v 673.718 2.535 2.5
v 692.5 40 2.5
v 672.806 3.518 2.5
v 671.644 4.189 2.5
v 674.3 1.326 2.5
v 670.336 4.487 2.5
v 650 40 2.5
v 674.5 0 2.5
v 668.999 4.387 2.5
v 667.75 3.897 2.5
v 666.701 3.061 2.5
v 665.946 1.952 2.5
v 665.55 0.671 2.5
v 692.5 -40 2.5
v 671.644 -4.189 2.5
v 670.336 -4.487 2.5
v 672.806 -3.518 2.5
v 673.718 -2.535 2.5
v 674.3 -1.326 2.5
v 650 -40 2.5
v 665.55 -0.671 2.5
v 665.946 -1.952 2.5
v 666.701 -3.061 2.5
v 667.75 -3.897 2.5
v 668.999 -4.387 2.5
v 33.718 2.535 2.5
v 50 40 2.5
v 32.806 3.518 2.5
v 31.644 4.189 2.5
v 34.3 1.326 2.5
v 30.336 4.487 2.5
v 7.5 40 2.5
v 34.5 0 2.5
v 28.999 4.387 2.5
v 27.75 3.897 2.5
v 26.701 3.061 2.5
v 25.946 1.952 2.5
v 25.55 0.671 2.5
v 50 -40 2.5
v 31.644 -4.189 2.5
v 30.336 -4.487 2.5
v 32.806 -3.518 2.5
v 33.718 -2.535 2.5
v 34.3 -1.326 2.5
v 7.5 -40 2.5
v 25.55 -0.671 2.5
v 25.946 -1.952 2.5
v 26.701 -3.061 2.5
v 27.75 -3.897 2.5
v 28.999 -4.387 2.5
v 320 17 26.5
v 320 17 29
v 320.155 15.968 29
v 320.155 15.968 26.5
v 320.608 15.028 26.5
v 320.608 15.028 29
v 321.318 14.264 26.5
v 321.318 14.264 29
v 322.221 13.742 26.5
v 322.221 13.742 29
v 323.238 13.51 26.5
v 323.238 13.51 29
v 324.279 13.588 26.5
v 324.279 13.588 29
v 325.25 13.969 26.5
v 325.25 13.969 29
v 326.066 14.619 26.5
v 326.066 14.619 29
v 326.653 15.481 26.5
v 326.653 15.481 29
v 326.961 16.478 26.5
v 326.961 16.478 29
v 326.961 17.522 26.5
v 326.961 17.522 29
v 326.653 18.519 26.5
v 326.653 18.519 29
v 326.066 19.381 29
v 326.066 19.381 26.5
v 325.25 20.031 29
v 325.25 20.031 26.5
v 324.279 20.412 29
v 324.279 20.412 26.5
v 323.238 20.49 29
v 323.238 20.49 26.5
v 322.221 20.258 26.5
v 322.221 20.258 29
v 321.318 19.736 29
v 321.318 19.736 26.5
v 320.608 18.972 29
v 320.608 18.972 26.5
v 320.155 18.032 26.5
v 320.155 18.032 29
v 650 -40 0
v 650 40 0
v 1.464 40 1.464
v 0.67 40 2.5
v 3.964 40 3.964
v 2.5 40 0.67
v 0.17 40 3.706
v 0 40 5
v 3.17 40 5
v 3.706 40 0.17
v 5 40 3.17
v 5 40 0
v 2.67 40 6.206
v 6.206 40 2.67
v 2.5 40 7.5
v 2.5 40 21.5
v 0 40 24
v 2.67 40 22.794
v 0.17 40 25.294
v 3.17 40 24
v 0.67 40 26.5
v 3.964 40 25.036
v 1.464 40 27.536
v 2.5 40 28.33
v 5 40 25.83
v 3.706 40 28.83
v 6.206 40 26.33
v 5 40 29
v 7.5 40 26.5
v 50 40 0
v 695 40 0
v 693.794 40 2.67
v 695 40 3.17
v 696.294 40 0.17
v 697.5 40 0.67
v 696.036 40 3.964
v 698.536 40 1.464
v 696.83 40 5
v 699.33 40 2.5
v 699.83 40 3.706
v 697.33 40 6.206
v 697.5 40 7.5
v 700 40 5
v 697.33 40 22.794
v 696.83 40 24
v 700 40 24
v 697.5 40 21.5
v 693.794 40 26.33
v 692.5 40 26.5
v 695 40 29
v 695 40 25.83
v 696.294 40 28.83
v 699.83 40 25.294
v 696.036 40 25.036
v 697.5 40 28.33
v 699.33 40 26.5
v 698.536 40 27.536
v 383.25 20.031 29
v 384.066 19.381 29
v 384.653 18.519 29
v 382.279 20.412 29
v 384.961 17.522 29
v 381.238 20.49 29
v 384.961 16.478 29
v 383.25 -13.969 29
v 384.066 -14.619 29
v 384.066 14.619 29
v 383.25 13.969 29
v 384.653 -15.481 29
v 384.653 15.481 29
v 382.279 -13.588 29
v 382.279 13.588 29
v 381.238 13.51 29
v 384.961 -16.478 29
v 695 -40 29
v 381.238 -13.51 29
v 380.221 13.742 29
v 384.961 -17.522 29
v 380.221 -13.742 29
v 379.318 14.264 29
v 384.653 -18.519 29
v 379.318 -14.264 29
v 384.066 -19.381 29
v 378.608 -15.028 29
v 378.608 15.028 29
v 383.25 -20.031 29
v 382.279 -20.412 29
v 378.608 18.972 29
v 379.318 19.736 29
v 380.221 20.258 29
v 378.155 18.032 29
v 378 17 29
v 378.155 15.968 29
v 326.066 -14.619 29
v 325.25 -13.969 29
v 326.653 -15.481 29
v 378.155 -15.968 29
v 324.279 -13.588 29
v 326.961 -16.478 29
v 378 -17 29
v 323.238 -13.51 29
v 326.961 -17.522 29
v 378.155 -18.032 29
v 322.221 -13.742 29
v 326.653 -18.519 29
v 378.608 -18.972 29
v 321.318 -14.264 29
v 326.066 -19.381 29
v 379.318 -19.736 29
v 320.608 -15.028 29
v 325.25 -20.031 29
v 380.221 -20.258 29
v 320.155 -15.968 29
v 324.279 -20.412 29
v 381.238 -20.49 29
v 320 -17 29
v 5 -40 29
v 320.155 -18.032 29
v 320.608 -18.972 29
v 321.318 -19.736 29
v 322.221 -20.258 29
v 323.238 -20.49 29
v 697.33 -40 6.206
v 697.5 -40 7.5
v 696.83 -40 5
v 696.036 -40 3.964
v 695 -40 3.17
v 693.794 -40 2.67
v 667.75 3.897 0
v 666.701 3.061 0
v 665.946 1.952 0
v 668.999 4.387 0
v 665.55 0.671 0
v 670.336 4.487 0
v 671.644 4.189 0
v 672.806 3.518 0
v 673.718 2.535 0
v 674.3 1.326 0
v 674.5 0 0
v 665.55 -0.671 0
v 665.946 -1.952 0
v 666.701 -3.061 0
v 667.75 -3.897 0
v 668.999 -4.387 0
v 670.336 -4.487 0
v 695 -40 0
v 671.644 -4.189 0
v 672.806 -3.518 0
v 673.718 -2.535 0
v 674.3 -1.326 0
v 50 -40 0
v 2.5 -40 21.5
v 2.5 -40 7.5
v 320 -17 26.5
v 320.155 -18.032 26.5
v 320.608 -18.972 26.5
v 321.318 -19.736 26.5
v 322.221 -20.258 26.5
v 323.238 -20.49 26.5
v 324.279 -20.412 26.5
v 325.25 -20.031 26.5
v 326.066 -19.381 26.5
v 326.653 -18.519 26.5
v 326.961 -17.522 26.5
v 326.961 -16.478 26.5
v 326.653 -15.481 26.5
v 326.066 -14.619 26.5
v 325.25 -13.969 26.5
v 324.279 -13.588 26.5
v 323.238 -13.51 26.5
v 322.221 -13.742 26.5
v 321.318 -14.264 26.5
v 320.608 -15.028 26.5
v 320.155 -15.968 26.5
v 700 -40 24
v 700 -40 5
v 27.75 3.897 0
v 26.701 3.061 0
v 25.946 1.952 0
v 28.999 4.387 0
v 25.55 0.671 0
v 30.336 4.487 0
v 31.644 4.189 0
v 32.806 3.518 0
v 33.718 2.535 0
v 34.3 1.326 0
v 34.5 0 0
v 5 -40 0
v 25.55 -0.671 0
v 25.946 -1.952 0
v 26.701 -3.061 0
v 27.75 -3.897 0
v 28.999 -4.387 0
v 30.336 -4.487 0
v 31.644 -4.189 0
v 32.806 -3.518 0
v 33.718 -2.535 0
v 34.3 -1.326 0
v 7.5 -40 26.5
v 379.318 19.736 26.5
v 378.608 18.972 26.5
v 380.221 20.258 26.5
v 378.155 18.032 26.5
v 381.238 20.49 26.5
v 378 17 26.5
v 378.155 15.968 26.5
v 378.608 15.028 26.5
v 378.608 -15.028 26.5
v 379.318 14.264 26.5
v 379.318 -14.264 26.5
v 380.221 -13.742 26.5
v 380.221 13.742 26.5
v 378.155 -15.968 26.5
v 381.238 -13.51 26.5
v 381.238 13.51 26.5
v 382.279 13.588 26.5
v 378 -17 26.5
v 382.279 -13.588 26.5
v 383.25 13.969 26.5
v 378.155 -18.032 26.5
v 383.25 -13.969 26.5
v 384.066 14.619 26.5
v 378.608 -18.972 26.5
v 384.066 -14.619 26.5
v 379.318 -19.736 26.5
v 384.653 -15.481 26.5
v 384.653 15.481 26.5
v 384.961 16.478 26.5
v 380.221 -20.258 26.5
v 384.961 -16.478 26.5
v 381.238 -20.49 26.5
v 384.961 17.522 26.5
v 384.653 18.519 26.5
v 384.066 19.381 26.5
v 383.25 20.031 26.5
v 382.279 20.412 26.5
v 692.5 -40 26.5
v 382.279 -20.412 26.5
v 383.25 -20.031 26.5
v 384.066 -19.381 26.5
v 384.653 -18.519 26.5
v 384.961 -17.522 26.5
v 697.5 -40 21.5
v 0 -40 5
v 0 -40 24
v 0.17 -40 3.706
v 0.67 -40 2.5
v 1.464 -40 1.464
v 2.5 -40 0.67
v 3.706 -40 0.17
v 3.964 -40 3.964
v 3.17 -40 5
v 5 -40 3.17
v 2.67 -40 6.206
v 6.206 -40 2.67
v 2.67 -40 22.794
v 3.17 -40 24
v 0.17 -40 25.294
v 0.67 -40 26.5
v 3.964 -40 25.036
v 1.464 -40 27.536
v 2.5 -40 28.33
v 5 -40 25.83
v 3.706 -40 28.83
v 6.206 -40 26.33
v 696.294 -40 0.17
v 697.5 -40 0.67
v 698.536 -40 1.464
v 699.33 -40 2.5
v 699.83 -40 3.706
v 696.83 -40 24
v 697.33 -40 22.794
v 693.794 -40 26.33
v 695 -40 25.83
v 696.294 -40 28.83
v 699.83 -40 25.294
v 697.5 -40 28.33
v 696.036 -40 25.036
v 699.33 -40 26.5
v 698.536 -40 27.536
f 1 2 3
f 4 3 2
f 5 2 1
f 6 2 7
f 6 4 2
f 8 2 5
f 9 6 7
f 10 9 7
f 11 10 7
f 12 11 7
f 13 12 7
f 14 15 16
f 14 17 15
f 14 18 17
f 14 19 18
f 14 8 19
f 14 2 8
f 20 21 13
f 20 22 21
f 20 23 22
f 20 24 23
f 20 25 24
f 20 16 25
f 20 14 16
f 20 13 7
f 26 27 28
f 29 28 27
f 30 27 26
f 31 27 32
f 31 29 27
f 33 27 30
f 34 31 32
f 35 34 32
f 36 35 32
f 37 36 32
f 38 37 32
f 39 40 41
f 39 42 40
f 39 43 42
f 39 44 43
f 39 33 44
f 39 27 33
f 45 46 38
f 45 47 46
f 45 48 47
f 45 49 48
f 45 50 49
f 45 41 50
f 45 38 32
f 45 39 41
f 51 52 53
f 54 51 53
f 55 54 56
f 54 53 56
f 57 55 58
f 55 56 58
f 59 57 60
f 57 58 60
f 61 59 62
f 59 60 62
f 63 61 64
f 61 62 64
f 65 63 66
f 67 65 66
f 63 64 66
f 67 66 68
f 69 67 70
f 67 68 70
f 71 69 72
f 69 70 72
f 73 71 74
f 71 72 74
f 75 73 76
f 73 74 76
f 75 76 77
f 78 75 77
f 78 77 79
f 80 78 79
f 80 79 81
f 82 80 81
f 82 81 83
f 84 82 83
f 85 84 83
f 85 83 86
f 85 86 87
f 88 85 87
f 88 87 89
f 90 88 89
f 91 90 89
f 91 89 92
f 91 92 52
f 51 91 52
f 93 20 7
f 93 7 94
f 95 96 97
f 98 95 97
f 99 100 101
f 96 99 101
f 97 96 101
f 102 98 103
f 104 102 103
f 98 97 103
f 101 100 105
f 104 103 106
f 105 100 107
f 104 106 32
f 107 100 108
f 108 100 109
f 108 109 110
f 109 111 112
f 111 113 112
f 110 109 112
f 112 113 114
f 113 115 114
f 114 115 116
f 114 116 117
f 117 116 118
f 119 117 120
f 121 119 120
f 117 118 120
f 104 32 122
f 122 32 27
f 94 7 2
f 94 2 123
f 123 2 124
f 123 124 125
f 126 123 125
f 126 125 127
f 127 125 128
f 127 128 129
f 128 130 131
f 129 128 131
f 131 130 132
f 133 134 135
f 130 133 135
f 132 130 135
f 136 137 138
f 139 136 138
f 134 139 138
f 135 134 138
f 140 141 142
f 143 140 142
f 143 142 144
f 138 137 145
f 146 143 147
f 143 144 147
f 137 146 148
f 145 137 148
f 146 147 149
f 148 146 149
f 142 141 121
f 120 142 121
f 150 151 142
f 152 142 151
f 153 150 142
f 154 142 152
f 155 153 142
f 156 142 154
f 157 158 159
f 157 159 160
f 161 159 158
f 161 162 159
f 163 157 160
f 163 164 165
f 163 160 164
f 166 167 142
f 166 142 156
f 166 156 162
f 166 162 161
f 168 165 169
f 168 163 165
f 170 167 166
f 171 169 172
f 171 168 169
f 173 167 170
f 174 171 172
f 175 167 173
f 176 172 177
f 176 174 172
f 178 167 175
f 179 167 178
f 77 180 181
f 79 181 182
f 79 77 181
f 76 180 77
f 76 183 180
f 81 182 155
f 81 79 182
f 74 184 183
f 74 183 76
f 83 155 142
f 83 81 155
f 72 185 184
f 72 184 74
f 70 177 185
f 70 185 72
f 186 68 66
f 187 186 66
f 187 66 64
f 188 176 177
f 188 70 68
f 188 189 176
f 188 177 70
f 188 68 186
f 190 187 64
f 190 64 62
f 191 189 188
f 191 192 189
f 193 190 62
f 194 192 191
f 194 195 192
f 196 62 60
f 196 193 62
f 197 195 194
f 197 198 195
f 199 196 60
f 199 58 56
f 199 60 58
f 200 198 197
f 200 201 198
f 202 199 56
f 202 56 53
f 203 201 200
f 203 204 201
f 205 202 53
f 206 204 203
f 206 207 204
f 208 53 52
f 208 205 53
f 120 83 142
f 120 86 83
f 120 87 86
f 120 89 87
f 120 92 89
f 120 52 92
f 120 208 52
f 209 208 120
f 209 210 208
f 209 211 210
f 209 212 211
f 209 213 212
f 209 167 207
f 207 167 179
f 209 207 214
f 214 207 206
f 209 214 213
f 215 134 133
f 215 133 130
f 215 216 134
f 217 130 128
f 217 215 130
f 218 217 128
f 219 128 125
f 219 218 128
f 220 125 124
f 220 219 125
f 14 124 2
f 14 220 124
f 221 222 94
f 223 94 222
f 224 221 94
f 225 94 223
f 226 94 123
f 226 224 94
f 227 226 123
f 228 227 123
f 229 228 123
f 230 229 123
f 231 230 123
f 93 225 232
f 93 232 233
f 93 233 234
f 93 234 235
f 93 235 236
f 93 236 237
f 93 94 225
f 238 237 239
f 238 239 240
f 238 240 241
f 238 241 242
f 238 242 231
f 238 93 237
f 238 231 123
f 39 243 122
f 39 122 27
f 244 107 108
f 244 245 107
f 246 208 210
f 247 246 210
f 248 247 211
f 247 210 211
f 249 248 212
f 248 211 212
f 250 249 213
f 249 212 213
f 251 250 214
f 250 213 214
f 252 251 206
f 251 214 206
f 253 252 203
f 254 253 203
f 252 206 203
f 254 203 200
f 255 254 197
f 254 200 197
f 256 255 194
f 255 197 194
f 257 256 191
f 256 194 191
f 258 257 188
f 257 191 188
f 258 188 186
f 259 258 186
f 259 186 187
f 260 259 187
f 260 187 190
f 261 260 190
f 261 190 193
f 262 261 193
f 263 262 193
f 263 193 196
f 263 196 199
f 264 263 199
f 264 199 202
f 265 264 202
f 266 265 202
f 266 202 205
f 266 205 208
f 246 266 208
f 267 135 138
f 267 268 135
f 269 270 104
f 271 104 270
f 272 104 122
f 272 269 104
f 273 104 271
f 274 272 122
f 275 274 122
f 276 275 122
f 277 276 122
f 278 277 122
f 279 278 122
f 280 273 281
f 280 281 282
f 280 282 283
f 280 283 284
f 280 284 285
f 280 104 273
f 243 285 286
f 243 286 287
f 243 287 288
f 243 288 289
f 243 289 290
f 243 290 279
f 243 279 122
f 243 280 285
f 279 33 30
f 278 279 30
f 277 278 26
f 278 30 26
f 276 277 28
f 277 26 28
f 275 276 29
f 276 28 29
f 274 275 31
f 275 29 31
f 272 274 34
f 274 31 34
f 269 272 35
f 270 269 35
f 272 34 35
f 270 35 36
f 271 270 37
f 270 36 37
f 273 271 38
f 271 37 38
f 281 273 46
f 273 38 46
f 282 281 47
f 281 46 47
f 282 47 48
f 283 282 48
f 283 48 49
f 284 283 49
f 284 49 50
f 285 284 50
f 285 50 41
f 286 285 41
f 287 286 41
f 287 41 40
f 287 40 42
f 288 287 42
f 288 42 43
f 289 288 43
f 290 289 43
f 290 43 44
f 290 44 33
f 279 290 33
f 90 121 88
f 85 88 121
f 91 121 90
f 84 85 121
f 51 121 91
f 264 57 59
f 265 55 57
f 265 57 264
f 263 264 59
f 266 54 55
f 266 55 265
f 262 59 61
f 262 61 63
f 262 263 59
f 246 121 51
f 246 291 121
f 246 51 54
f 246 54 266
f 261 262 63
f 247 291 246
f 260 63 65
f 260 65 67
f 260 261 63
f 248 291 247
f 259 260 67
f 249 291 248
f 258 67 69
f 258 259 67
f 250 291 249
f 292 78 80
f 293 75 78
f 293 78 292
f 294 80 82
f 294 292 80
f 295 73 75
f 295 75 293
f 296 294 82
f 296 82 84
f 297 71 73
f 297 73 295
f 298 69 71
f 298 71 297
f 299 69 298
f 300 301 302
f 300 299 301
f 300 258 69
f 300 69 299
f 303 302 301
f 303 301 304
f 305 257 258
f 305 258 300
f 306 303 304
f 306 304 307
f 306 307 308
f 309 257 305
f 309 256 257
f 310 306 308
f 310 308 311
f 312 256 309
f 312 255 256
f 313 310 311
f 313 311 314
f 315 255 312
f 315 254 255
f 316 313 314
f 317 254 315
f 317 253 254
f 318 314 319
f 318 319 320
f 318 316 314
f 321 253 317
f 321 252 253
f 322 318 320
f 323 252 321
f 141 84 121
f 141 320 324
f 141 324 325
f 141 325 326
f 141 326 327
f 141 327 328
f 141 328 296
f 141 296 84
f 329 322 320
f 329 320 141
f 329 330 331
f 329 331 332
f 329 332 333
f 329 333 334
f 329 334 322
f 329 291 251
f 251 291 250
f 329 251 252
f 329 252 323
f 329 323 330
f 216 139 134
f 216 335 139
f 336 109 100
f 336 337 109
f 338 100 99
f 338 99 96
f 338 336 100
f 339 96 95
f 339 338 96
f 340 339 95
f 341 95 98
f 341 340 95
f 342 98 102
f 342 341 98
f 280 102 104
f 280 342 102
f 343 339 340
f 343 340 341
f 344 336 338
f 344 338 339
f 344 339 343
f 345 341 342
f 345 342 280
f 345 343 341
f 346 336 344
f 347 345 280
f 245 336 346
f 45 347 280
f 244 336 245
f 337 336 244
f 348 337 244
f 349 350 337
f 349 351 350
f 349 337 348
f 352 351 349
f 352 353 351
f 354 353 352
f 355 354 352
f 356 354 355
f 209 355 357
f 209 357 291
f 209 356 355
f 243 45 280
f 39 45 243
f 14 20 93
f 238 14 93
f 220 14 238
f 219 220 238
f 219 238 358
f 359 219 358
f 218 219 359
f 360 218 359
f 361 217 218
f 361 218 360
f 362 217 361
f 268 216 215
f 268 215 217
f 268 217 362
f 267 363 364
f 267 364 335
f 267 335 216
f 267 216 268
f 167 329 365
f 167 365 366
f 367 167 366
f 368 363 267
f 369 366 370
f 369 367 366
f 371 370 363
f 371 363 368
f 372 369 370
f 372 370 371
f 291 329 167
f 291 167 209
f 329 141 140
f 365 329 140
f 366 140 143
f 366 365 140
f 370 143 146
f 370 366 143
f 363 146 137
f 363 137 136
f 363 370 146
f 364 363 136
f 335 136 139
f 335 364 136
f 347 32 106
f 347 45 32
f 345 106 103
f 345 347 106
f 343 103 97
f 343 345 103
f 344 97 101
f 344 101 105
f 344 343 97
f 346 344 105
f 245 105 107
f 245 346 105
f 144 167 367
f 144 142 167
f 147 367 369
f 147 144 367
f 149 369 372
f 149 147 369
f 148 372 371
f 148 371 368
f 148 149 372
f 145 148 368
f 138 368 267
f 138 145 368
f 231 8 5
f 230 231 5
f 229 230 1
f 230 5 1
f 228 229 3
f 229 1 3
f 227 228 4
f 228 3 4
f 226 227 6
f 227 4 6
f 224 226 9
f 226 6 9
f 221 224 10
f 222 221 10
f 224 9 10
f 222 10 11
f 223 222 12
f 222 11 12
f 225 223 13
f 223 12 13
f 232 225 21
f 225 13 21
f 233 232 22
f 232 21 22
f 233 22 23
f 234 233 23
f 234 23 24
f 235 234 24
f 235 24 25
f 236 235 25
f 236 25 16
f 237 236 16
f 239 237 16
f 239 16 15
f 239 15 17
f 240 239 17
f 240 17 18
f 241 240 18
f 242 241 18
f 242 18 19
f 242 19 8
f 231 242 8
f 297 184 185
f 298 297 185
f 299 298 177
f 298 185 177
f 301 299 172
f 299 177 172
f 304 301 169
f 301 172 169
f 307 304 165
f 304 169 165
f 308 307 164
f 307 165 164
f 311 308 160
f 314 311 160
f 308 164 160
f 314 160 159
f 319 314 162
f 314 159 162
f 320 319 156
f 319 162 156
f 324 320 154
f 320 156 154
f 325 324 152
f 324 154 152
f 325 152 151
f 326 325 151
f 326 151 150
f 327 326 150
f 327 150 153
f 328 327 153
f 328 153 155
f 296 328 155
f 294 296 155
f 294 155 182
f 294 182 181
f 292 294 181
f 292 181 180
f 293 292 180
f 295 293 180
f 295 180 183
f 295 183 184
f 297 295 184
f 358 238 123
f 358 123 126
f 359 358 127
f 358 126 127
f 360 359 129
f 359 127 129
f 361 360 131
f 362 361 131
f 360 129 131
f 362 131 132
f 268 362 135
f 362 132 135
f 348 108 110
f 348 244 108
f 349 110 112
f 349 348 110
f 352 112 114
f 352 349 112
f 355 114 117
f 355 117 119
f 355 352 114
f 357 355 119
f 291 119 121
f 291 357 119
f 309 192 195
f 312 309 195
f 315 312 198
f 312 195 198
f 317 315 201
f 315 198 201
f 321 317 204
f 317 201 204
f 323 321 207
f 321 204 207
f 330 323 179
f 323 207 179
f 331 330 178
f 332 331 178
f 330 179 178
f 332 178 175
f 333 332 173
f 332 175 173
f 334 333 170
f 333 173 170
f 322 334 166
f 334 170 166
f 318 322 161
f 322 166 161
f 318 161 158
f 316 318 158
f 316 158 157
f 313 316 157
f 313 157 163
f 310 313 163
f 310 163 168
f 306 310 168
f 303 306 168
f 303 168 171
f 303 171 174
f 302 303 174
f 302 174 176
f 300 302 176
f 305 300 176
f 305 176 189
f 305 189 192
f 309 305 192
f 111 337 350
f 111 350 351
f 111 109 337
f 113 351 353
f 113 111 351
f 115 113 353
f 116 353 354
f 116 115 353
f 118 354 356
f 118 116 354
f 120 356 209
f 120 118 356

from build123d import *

# Parameters (mm, degrees)
F1_DEPTH = 40
F4_D     = 9
F4_DEPTH = 12
F4_TIP   = 2.7038727856
F5_D     = 9
F5_DEPTH = 12
F5_TIP   = 2.7038727856
F7_D     = 7
F8_R     = 5


# Not quite as in the source:
# - a feature names something its author has since deleted; it is built from what else it names


with BuildPart() as f1:
    # F0 (on Front) → F1 (new body, symmetric)
    with BuildSketch(Plane.XZ):
        Polygon((0, 29), (0, 0), (50, 0), (50, 2.5), (2.5, 2.5), (2.5, 26.5), (697.5, 26.5), (697.5, 2.5), (650, 2.5), (650, 0), (700, 0), (700, 29), align=None)
    extrude(amount=F1_DEPTH, both=True)

    # F4 (one way)
    with BuildSketch(Plane.XY.offset(2.5)):
        with Locations((670, 0)):
            Circle(F4_D / 2)
    extrude(amount=-F4_DEPTH, mode=Mode.SUBTRACT)
    with Locations(Plane.XY.offset(2.5)):
        with Locations((670, 0)):
            with Locations((0, 0, -(F4_DEPTH + F4_TIP / 2))):  # 118° drill point
                Cone(0, F4_D / 2, F4_TIP, mode=Mode.SUBTRACT)

    # F5 (one way)
    with BuildSketch(Plane.XY.offset(2.5)):
        with Locations((30, 0)):
            Circle(F5_D / 2)
    extrude(amount=-F5_DEPTH, mode=Mode.SUBTRACT)
    with Locations(Plane.XY.offset(2.5)):
        with Locations((30, 0)):
            with Locations((0, 0, -(F5_DEPTH + F5_TIP / 2))):  # 118° drill point
                Cone(0, F5_D / 2, F5_TIP, mode=Mode.SUBTRACT)

    # F7 (through all)
    with Locations(Plane(origin=(0, 0, 26.5), x_dir=(1, 0, 0), z_dir=(0, 0, -1))):
        with Locations((381.5, -17), (323.5, -17), (323.5, 17), (381.5, 17)):
            Hole(F7_D / 2)

    # F8
    f8_edges = [f1.edges().sort_by_distance(p)[0] for p in [
        (0, 0, 29),
        (0, 0, 0),
        (700, 0, 29),
        (700, 0, 0),
        (2.5, 0, 2.5),
        (2.5, 0, 26.5),
        (697.5, 0, 2.5),
        (697.5, 0, 26.5),
    ]]
    fillet(f8_edges, radius=F8_R)


solid = f1.part
